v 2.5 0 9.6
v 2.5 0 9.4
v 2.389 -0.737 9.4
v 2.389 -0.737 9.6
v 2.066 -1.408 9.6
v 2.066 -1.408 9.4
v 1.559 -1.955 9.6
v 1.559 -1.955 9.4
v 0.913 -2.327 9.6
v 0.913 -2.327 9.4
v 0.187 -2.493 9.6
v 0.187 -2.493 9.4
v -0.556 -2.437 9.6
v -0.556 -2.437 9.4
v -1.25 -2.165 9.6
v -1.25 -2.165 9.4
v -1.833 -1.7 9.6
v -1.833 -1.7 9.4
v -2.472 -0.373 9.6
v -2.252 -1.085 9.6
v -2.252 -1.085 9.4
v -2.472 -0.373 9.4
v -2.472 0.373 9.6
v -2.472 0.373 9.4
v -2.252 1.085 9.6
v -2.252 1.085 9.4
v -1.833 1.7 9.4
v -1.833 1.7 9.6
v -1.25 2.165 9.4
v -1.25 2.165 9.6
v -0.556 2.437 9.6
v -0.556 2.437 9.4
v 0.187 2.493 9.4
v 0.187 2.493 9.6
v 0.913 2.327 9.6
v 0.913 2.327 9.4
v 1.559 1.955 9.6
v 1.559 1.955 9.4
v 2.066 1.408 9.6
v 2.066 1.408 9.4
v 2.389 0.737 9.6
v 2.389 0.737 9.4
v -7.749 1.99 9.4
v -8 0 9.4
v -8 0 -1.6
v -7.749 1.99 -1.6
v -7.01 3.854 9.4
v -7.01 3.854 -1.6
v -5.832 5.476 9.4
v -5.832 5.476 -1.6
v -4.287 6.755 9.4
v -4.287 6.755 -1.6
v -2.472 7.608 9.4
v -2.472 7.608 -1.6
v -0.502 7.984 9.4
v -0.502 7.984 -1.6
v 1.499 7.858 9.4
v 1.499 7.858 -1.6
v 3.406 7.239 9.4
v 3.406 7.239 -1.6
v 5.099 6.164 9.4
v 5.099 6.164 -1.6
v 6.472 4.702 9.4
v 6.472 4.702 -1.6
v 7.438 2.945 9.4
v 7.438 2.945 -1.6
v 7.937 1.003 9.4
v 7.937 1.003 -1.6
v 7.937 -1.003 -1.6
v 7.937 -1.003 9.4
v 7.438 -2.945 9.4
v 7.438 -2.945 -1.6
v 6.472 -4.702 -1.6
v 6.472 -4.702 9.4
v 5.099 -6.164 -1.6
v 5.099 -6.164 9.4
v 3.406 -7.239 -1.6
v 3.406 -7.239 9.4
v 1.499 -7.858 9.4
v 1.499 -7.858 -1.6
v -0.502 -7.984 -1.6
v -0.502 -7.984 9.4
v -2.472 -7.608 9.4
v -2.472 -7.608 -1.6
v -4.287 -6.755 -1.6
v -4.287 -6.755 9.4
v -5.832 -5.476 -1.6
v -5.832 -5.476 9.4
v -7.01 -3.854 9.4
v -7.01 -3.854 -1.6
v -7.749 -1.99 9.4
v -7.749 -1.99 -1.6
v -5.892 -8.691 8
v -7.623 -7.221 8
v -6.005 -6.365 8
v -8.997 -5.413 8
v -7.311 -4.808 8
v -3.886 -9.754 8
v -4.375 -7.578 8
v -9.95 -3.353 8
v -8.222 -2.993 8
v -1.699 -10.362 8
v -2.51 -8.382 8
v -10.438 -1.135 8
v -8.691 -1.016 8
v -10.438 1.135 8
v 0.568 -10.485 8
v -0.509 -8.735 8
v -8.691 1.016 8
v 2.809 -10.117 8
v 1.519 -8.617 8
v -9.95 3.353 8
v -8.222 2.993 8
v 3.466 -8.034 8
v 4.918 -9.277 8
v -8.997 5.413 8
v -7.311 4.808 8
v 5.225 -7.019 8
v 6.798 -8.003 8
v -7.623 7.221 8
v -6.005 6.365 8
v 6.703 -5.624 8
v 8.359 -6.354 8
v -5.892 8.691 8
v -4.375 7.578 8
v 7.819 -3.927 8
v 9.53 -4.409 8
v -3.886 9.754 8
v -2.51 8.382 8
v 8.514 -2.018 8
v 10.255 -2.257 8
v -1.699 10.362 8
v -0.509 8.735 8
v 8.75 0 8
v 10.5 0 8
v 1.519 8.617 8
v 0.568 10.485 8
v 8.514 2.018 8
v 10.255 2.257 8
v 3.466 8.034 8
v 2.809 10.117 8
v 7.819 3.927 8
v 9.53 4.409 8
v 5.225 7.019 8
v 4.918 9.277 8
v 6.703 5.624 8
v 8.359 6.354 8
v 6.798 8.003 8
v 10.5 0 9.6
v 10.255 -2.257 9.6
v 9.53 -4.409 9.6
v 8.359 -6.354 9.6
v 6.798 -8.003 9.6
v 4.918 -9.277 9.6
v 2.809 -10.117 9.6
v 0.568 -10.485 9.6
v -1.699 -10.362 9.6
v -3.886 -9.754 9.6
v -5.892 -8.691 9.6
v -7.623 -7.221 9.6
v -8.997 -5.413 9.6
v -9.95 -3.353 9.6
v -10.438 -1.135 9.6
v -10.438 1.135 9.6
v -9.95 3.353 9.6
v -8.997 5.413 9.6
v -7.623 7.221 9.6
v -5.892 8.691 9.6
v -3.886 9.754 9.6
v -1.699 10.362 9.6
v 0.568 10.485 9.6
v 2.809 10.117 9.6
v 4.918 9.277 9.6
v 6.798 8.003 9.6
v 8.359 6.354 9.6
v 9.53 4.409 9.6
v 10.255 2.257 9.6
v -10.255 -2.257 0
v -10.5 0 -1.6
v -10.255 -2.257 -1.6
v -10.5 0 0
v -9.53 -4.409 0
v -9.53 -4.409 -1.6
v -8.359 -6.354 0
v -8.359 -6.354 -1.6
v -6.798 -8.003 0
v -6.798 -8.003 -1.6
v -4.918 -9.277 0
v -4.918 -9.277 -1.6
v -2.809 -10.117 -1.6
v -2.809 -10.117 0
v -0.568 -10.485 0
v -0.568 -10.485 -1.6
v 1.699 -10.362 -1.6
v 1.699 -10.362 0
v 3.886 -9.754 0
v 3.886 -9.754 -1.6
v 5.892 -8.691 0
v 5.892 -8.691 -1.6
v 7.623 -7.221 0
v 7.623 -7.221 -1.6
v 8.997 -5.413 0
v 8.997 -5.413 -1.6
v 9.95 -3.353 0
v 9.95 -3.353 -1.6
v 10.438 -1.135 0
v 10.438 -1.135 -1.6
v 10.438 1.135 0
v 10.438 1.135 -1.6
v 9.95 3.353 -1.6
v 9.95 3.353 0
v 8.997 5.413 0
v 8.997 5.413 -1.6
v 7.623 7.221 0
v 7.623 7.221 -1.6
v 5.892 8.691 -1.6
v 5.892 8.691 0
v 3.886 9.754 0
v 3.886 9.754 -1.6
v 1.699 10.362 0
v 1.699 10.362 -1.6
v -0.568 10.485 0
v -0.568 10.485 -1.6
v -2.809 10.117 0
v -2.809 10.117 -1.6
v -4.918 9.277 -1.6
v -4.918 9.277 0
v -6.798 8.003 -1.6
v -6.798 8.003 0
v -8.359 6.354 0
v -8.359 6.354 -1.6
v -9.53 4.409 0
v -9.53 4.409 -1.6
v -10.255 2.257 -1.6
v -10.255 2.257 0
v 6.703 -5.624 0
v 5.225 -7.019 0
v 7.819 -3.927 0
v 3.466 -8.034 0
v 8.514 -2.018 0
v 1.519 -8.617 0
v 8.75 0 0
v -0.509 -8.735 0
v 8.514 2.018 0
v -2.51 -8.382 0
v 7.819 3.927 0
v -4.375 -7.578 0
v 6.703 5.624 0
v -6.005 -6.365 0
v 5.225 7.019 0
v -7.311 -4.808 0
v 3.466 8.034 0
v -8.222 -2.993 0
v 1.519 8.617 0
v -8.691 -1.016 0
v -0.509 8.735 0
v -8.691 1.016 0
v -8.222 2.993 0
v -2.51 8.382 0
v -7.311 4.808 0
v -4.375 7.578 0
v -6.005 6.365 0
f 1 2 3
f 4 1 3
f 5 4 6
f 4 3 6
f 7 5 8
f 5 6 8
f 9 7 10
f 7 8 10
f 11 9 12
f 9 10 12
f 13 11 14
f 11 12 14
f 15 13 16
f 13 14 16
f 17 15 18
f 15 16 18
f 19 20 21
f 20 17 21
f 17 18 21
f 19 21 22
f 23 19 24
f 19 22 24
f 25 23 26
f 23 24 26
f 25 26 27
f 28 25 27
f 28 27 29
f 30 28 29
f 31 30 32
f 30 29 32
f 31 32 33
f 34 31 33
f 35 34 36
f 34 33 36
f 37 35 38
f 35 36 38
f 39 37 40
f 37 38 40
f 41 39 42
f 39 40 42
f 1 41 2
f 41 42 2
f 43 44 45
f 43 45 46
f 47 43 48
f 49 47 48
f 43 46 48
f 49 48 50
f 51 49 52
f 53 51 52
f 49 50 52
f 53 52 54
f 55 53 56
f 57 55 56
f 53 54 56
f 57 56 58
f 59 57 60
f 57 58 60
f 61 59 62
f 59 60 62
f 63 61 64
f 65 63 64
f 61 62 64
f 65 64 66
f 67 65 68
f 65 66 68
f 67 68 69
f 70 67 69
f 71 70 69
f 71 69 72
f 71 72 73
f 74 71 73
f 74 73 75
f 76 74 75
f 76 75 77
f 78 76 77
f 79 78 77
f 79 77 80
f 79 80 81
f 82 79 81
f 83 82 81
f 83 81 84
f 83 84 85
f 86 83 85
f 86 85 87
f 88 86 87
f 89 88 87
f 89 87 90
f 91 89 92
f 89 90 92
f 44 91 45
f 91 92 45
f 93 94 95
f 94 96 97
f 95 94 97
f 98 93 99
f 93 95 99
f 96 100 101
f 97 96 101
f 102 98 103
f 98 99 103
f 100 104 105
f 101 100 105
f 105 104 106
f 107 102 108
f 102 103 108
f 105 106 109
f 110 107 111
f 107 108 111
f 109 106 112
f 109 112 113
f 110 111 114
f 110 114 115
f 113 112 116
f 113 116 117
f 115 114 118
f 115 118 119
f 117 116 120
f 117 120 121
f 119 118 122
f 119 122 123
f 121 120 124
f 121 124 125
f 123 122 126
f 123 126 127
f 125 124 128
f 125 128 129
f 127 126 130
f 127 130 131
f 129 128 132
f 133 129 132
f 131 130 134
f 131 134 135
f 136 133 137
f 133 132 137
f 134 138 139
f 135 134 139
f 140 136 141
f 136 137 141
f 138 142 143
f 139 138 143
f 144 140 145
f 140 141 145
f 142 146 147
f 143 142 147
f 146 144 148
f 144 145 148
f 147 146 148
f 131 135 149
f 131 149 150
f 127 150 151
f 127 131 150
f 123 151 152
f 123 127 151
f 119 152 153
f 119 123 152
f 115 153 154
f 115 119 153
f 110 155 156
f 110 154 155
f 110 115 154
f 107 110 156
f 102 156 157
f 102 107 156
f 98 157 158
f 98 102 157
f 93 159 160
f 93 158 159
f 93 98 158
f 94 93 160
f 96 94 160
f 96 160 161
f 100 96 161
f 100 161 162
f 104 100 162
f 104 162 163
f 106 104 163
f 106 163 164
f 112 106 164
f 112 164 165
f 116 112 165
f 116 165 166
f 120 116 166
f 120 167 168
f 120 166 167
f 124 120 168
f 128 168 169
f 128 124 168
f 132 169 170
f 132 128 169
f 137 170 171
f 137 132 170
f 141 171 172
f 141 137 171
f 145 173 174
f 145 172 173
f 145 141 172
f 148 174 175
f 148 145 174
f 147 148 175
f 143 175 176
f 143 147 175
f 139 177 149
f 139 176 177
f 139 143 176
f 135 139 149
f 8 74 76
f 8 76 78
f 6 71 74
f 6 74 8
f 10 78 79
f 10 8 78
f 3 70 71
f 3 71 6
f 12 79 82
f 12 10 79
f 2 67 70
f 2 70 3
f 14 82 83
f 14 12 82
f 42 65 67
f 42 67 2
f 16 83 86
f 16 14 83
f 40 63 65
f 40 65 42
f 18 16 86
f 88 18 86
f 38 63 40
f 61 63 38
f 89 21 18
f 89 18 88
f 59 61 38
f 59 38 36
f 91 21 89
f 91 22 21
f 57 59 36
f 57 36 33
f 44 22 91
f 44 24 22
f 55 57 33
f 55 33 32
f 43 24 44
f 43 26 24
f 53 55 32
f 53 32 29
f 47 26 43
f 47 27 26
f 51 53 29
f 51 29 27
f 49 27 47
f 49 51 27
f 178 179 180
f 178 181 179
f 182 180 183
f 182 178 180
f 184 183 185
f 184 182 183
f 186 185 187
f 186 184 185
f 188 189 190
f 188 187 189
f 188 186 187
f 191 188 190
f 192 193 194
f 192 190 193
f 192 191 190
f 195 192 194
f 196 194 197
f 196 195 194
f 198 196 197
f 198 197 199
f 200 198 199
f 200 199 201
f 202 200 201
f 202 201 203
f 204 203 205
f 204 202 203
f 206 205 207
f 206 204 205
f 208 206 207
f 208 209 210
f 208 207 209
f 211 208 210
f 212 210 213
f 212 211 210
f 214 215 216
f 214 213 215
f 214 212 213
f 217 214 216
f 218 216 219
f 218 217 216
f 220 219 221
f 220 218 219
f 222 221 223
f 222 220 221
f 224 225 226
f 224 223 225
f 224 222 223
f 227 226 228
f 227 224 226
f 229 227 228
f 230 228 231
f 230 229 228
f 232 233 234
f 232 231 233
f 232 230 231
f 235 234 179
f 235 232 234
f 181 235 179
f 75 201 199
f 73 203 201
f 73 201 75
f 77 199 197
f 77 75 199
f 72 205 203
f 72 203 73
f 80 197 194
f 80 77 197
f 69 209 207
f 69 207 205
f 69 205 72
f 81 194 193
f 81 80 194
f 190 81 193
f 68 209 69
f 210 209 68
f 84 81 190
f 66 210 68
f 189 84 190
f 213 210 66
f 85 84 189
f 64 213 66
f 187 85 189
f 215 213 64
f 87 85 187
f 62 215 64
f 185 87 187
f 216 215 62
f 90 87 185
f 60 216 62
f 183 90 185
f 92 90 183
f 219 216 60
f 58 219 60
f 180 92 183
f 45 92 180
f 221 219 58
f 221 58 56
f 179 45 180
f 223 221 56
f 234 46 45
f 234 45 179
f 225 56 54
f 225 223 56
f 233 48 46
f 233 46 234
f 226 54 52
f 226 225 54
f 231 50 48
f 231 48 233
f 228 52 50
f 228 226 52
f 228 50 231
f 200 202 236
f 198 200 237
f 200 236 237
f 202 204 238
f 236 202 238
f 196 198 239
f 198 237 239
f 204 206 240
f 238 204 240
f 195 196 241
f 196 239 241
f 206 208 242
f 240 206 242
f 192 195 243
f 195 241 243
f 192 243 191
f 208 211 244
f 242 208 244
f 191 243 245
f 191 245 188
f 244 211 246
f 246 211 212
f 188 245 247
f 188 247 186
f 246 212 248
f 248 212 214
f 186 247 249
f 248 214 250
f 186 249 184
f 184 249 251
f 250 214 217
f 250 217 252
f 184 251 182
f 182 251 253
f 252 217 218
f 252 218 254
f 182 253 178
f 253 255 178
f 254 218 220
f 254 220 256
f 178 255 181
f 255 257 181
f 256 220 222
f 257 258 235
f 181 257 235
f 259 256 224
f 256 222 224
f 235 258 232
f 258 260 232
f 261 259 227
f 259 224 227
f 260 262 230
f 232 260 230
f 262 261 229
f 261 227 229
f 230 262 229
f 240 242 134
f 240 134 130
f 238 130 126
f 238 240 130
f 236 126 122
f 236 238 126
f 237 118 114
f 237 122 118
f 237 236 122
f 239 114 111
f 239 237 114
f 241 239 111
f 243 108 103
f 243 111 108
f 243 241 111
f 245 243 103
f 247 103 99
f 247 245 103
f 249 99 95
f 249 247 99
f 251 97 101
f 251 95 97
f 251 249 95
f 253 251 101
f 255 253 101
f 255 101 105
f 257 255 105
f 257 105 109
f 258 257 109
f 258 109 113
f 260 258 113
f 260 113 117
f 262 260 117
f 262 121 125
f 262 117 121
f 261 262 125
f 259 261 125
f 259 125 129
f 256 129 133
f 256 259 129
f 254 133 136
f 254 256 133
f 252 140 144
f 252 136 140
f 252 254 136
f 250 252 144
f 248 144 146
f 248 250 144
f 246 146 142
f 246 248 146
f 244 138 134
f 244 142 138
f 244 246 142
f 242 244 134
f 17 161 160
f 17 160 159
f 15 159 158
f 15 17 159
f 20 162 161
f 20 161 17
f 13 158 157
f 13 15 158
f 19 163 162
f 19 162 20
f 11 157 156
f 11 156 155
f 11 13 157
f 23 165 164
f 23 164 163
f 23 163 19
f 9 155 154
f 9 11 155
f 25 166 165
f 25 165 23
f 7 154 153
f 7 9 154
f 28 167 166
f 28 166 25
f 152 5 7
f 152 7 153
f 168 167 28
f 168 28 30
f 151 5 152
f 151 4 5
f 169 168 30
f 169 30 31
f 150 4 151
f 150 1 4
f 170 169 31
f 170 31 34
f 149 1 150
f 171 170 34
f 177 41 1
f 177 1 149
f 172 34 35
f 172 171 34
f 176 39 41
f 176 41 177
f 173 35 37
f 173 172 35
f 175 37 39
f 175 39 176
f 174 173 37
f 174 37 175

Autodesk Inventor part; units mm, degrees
ref_plane "YZ Plane" through (0, 0, 0) normal (1, 0, 0) x (0, 1, 0)
ref_plane "XZ Plane" through (0, 0, 0) normal (0, 1, 0) x (-1, 0, 0)
ref_plane "XY Plane" through (0, 0, 0) normal (0, 0, 1) x (1, 0, 0)
sketch "Sketch1" plane through (0, 0, 0) normal (0, 0, 1) x (1, 0, 0)
  circle A0 centre (0, 0) radius 8.75
  circle A1 centre (0, 0) radius 2.5
  dimension "d0" = 17.5
  dimension "d1" = 5
extrude "Extrusion1" add sketch "Sketch1" along normal blind 8
sketch "Sketch2" plane through (0, 0, 8) normal (0, 0, 1) x (1, 0, 0)
  circle A0 centre (0, 0) radius 2.5 projected
  circle A1 centre (0, 0) radius 8.75 projected
  circle A2 centre (0, 0) radius 10.5
  dimension "d4" = 21
extrude "Extrusion2" add sketch "Sketch2" along normal blind 1.6 contours A1 | A2
sketch "Sketch3" plane through (0, 0, 0) normal (0, 0, -1) x (-1, 0, 0)
  circle A0 centre (0, 0) radius 2.5 projected
  circle A1 centre (0, 0) radius 8.75 projected
  circle A2 centre (0, 0) radius 10.5
  dimension "d7" = 21
extrude "Extrusion3" add sketch "Sketch3" along normal blind 1.6 contours A1 | A2
sketch "Sketch5" plane through (0, 0, -1.6) normal (0, 0, -1) x (-1, 0, 0)
  circle A0 centre (0, 0) radius 2.5 projected
  circle A1 centre (0, 0) radius 10.5 projected
  circle A2 centre (0, 0) radius 8
  dimension "d11" = 16
extrude "Extrusion4" cut sketch "Sketch5" against normal blind 11 contours A2
properties part number "MSK01-06" material "Nylon-6/6"
